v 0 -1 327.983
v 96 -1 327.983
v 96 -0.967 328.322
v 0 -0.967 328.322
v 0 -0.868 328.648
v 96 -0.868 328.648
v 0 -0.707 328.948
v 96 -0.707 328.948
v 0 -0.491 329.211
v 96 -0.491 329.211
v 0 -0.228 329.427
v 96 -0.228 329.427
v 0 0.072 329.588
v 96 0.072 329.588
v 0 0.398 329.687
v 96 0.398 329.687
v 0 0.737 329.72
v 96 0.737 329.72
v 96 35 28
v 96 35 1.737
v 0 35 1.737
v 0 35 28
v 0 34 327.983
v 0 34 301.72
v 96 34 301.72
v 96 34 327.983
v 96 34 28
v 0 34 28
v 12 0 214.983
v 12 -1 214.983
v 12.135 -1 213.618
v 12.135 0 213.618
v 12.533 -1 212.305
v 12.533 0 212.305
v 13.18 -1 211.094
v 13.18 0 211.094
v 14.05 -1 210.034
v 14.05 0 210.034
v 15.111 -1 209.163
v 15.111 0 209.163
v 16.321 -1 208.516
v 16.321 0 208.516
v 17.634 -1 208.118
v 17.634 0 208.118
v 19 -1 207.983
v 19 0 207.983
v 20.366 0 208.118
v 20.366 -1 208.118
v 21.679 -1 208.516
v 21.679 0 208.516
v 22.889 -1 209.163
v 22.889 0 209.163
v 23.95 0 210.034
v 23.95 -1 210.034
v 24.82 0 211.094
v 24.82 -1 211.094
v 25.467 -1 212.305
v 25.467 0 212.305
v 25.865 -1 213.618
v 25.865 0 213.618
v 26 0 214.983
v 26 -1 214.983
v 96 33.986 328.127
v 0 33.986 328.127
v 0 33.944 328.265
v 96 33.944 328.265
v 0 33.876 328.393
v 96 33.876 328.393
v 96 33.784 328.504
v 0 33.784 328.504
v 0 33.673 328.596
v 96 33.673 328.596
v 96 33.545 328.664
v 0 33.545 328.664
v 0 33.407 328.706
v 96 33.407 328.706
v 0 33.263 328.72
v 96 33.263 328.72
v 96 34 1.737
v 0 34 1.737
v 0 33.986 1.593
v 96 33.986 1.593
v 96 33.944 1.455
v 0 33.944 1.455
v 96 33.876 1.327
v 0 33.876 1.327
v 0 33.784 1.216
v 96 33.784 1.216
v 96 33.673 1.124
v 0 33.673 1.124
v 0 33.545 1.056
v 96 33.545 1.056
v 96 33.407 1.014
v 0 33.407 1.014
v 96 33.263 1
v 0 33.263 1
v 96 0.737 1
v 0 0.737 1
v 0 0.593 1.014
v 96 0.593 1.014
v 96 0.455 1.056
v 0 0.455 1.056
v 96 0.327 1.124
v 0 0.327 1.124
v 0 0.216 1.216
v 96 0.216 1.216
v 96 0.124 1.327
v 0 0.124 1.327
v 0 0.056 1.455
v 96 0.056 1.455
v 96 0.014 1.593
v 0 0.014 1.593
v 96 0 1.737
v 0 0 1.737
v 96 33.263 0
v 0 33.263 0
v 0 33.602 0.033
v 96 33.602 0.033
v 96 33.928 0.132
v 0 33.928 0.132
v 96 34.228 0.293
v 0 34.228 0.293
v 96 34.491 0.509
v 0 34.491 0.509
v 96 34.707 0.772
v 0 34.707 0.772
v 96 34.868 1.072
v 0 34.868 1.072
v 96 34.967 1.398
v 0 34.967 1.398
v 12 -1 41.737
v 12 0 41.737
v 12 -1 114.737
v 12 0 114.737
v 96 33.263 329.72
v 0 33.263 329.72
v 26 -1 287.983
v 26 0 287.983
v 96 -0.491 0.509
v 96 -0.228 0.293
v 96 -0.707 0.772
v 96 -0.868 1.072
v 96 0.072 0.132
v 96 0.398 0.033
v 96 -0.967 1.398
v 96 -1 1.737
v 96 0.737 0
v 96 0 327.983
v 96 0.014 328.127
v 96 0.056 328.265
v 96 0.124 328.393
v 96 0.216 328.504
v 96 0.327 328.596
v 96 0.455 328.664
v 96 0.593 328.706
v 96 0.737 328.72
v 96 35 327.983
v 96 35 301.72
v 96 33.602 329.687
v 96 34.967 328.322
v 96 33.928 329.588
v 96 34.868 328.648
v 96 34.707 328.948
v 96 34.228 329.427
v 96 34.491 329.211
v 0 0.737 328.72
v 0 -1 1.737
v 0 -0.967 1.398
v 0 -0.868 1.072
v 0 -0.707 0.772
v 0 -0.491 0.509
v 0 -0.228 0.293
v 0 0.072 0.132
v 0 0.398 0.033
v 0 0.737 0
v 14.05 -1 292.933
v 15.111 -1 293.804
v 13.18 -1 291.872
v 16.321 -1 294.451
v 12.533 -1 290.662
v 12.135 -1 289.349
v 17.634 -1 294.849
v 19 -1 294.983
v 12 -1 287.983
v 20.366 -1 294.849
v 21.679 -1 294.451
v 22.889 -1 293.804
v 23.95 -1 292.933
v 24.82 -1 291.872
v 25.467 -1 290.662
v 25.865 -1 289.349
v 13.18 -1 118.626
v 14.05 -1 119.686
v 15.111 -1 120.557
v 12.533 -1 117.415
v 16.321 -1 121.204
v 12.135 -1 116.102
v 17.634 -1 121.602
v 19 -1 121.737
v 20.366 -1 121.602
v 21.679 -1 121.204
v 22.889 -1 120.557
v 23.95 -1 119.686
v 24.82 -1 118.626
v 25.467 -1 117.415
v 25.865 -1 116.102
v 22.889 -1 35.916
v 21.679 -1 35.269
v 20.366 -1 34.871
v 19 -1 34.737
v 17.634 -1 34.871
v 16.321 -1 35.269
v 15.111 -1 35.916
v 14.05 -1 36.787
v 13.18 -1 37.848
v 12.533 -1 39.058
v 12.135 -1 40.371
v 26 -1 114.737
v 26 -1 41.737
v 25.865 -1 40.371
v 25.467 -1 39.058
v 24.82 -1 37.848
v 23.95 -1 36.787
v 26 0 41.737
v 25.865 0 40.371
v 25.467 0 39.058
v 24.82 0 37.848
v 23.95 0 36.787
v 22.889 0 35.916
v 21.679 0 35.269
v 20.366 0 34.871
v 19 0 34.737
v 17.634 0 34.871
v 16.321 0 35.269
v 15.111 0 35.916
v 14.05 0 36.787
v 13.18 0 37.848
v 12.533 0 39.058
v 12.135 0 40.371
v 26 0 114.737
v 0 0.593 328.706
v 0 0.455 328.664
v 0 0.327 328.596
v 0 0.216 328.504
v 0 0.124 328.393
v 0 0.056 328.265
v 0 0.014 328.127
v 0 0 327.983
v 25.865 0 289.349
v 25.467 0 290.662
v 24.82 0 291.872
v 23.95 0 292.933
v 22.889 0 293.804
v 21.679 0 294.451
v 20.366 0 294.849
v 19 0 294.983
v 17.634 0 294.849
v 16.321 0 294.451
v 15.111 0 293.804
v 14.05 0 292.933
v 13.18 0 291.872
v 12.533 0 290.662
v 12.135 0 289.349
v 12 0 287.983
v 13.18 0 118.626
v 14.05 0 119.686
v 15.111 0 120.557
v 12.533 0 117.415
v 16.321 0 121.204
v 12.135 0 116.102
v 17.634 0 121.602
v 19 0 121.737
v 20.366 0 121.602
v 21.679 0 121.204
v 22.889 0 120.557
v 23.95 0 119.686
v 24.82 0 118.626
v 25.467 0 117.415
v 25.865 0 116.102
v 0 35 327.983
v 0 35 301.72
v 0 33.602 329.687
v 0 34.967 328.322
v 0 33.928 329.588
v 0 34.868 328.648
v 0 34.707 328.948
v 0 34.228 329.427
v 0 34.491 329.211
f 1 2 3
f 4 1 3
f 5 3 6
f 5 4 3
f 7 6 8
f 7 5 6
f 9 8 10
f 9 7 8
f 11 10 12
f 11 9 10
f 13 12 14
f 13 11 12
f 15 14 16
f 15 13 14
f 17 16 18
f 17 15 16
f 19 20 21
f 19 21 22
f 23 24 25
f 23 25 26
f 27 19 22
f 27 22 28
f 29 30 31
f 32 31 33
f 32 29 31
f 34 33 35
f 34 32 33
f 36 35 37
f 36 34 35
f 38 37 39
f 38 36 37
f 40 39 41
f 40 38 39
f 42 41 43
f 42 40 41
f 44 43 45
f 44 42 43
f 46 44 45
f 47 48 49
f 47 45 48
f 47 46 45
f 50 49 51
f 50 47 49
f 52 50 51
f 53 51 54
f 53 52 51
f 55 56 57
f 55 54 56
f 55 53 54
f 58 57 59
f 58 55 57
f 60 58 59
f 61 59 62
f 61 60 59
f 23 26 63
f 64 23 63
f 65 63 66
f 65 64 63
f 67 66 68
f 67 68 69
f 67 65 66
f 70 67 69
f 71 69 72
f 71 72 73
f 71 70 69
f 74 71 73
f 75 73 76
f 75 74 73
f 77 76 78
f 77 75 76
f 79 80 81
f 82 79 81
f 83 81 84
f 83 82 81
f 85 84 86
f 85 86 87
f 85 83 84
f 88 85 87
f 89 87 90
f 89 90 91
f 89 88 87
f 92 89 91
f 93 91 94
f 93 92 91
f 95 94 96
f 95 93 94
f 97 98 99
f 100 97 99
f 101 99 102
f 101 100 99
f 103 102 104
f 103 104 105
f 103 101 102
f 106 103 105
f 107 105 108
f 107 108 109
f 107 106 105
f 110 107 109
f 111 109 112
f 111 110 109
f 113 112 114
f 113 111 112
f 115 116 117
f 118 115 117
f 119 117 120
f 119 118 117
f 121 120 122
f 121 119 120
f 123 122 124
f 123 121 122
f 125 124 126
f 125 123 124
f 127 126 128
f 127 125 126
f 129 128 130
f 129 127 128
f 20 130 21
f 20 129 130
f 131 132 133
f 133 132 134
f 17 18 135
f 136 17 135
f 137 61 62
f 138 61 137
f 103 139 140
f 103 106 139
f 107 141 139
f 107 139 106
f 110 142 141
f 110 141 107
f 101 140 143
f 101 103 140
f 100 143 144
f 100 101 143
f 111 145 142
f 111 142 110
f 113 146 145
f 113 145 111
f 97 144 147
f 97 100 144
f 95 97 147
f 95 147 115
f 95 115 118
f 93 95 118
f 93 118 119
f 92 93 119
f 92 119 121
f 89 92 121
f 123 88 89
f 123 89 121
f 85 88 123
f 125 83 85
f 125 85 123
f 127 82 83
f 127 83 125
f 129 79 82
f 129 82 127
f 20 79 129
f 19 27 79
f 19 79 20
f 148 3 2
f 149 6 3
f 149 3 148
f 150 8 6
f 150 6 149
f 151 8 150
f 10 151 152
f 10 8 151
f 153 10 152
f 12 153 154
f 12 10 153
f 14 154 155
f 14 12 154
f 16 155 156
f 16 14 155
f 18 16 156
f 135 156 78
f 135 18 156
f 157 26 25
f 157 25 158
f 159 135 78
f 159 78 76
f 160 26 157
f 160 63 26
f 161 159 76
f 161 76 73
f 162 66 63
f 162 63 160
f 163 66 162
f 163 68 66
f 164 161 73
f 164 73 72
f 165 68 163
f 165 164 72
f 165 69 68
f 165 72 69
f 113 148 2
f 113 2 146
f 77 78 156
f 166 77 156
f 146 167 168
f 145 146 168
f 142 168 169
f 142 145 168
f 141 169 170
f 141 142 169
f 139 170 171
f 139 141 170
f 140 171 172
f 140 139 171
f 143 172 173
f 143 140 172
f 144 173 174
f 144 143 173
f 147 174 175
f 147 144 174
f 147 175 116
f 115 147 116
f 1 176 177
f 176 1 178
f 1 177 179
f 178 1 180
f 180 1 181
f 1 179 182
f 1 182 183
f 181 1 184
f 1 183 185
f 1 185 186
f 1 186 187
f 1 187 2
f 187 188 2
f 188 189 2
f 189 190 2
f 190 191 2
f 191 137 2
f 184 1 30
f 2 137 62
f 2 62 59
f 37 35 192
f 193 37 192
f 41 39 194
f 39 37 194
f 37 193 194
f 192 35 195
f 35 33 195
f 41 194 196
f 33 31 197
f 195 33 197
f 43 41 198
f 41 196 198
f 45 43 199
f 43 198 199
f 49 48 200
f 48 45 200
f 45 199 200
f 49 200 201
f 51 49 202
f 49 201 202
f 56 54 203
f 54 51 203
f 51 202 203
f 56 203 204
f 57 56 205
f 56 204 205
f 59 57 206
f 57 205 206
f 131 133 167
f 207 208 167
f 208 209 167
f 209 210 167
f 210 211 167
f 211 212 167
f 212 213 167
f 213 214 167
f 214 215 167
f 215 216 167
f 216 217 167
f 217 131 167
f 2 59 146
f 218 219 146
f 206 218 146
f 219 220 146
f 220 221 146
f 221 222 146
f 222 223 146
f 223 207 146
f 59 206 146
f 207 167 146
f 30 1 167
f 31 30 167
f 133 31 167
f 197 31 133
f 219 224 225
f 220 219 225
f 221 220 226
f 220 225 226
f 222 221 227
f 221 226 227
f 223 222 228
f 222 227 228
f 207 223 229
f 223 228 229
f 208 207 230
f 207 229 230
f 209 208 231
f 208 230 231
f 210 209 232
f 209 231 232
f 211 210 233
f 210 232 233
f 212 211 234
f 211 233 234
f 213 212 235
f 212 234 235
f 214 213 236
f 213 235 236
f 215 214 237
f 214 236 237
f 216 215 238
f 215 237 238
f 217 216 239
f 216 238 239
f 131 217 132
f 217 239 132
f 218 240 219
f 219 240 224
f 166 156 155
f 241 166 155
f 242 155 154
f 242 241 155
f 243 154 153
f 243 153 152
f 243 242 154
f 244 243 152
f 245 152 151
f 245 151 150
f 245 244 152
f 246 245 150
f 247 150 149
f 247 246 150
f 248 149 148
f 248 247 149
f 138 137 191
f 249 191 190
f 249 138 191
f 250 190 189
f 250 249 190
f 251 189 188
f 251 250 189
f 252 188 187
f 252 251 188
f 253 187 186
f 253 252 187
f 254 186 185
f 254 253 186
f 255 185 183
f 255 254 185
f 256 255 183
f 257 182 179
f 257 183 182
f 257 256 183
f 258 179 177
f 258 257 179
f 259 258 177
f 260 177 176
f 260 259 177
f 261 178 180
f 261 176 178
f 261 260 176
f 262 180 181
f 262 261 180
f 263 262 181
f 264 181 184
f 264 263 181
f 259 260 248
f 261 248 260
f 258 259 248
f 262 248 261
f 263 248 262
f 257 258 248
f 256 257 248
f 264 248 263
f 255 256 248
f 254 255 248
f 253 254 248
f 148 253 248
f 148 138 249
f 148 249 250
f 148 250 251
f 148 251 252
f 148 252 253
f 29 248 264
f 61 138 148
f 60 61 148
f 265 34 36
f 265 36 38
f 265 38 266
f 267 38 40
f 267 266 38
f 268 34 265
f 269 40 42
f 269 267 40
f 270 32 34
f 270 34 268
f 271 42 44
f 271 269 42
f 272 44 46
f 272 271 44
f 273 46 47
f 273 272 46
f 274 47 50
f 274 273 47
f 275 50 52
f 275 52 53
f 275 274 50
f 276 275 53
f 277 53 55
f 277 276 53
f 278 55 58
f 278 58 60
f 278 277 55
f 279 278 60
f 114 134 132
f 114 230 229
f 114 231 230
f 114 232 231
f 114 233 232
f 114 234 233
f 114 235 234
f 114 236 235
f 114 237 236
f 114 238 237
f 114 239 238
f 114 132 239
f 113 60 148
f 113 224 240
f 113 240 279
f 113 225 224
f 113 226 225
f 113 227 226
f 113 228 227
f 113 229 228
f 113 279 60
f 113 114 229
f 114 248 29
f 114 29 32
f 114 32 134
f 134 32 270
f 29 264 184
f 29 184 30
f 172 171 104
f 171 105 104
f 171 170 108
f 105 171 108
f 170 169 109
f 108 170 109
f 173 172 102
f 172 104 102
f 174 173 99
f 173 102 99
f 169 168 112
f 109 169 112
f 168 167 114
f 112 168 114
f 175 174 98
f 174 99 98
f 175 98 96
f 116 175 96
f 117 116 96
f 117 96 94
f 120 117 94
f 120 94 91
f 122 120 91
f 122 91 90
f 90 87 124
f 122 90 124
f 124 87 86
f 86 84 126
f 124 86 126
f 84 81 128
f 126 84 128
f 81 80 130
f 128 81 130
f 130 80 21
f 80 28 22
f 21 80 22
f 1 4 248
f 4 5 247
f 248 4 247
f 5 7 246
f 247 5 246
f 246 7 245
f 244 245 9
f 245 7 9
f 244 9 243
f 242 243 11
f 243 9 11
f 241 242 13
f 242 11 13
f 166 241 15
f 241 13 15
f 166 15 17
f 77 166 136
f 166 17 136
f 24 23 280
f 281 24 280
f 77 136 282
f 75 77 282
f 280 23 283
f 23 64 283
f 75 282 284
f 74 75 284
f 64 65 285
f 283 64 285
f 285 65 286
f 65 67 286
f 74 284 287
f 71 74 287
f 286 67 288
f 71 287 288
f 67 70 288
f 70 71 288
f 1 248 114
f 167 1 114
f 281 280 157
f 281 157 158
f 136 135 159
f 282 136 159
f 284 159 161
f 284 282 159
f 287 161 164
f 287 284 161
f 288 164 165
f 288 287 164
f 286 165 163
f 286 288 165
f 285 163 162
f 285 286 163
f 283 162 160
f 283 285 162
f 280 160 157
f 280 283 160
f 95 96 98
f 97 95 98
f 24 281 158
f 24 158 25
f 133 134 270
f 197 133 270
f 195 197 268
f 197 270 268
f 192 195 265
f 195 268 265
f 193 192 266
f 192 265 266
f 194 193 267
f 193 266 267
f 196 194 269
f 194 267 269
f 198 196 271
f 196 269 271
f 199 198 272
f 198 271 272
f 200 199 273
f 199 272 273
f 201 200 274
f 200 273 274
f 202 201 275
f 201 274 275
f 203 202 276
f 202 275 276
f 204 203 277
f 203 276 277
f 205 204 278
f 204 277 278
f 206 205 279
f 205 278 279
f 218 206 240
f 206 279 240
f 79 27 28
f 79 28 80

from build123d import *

# Parameters (mm, degrees)
SKETCH1_W                    = 96
SKETCH1_H                    = 1
BASE_FLANGE1_DEPTH           = 329.72
EDGE_FLANGE1_STRIP_W         = 5.4732
EDGE_FLANGE1_STRIP_H         = 1
EDGE_FLANGE1_STRIP_CUT_DEPTH = 96
EDGE_FLANGE1_DEPTH           = 96
EDGE_FLANGE2_STRIP_W         = 5.4732
EDGE_FLANGE2_STRIP_H         = 1
EDGE_FLANGE2_STRIP_CUT_DEPTH = 96
EDGE_FLANGE2_DEPTH           = 96
EDGE_FLANGE3_STRIP_W         = 5.4732
EDGE_FLANGE3_STRIP_H         = 1
EDGE_FLANGE3_STRIP_CUT_DEPTH = 96
EDGE_FLANGE3_DEPTH           = 96
EDGE_FLANGE4_STRIP_W         = 5.4732
EDGE_FLANGE4_STRIP_H         = 1
EDGE_FLANGE4_STRIP_CUT_DEPTH = 96
EDGE_FLANGE4_DEPTH           = 96
CUT_EXTRUDE1_DEPTH           = 10


# Sheet-metal steps are written as plain solids
with BuildPart() as part:
    # Sketch1 → Base-Flange1 (new body)
    with BuildSketch(Plane.XY):
        with Locations((48, -0.5)):
            Rectangle(SKETCH1_W, SKETCH1_H)
    extrude(amount=BASE_FLANGE1_DEPTH)

    # Edge-Flange1 strip (across the edge) → Edge-Flange1 strip cut (cut)
    with BuildSketch(Plane(origin=(0, 0, 329.72), x_dir=(0, 0, -1), z_dir=(1, 0, 0))):
        with Locations((-1, -0.5)):
            Rectangle(EDGE_FLANGE1_STRIP_W, EDGE_FLANGE1_STRIP_H)
    extrude(amount=EDGE_FLANGE1_STRIP_CUT_DEPTH, mode=Mode.SUBTRACT)

    # Edge-Flange1 section (across the edge) → Edge-Flange1 (add)
    with BuildSketch(Plane(origin=(0, 0, 329.72), x_dir=(0, 0, -1), z_dir=(1, 0, 0))):
        with BuildLine():
            Line((0, 0.7366), (0, 35))
            Line((0, 35), (1, 35))
            Line((1, 35), (1, 0.7366))
            ThreePointArc((1, 0.7366), (1.215745145, 0.215745145), (1.7366, 0))
            Line((1.7366, 0), (1.7366, -1))
            ThreePointArc((1.7366, -1), (0.508638364, -0.491361636), (0, 0.7366))
        make_face()
    extrude(amount=EDGE_FLANGE1_DEPTH)

    # Edge-Flange2 strip (across the edge) → Edge-Flange2 strip cut (cut)
    with BuildSketch(Plane.ZY.offset(-96)):
        with Locations((-1, -0.5)):
            Rectangle(EDGE_FLANGE2_STRIP_W, EDGE_FLANGE2_STRIP_H)
    extrude(amount=EDGE_FLANGE2_STRIP_CUT_DEPTH, mode=Mode.SUBTRACT)

    # Edge-Flange2 section (across the edge) → Edge-Flange2 (add)
    with BuildSketch(Plane.ZY.offset(-96)):
        with BuildLine():
            Line((0, 0.7366), (0, 35))
            Line((0, 35), (1, 35))
            Line((1, 35), (1, 0.7366))
            ThreePointArc((1, 0.7366), (1.215745145, 0.215745145), (1.7366, 0))
            Line((1.7366, 0), (1.7366, -1))
            ThreePointArc((1.7366, -1), (0.508638364, -0.491361636), (0, 0.7366))
        make_face()
    extrude(amount=EDGE_FLANGE2_DEPTH)

    # Edge-Flange3 strip (across the edge) → Edge-Flange3 strip cut (cut)
    with BuildSketch(Plane(origin=(0, 35, 328.72), x_dir=(0, -1, 0), z_dir=(1, 0, 0))):
        with Locations((-1, -0.5)):
            Rectangle(EDGE_FLANGE3_STRIP_W, EDGE_FLANGE3_STRIP_H)
    extrude(amount=EDGE_FLANGE3_STRIP_CUT_DEPTH, mode=Mode.SUBTRACT)

    # Edge-Flange3 section (across the edge) → Edge-Flange3 (add)
    with BuildSketch(Plane(origin=(0, 35, 328.72), x_dir=(0, -1, 0), z_dir=(1, 0, 0))):
        with BuildLine():
            Line((0, 0.7366), (0, 27))
            Line((0, 27), (1, 27))
            Line((1, 27), (1, 0.7366))
            ThreePointArc((1, 0.7366), (1.215745145, 0.215745145), (1.7366, 0))
            Line((1.7366, 0), (1.7366, -1))
            ThreePointArc((1.7366, -1), (0.508638364, -0.491361636), (0, 0.7366))
        make_face()
    extrude(amount=EDGE_FLANGE3_DEPTH)

    # Edge-Flange4 strip (across the edge) → Edge-Flange4 strip cut (cut)
    with BuildSketch(Plane(origin=(96, 35, 1), x_dir=(0, -1, 0), z_dir=(-1, 0, 0))):
        with Locations((-1, -0.5)):
            Rectangle(EDGE_FLANGE4_STRIP_W, EDGE_FLANGE4_STRIP_H)
    extrude(amount=EDGE_FLANGE4_STRIP_CUT_DEPTH, mode=Mode.SUBTRACT)

    # Edge-Flange4 section (across the edge) → Edge-Flange4 (add)
    with BuildSketch(Plane(origin=(96, 35, 1), x_dir=(0, -1, 0), z_dir=(-1, 0, 0))):
        with BuildLine():
            Line((0, 0.7366), (0, 27))
            Line((0, 27), (1, 27))
            Line((1, 27), (1, 0.7366))
            ThreePointArc((1, 0.7366), (1.215745145, 0.215745145), (1.7366, 0))
            Line((1.7366, 0), (1.7366, -1))
            ThreePointArc((1.7366, -1), (0.508638364, -0.491361636), (0, 0.7366))
        make_face()
    extrude(amount=EDGE_FLANGE4_DEPTH)

    # Sketch22 → Cut-Extrude1 (cut)
    with BuildSketch(Plane(origin=(0, 0, 0), x_dir=(1, 0, 0), z_dir=(0, 1, 0))):
        with BuildLine():
            Line((26, -214.9834), (26, -287.9834))
            ThreePointArc((26, -287.9834), (19, -294.9834), (12, -287.9834))
            Line((12, -287.9834), (12, -214.9834))
            ThreePointArc((12, -214.9834), (19, -207.9834), (26, -214.9834))
        make_face()
        with BuildLine():
            Line((26, -114.7366), (26, -41.7366))
            ThreePointArc((26, -41.7366), (19, -34.7366), (12, -41.7366))
            Line((12, -41.7366), (12, -114.7366))
            ThreePointArc((12, -114.7366), (19, -121.7366), (26, -114.7366))
        make_face()
    extrude(amount=-CUT_EXTRUDE1_DEPTH, mode=Mode.SUBTRACT)


solid = part.part
